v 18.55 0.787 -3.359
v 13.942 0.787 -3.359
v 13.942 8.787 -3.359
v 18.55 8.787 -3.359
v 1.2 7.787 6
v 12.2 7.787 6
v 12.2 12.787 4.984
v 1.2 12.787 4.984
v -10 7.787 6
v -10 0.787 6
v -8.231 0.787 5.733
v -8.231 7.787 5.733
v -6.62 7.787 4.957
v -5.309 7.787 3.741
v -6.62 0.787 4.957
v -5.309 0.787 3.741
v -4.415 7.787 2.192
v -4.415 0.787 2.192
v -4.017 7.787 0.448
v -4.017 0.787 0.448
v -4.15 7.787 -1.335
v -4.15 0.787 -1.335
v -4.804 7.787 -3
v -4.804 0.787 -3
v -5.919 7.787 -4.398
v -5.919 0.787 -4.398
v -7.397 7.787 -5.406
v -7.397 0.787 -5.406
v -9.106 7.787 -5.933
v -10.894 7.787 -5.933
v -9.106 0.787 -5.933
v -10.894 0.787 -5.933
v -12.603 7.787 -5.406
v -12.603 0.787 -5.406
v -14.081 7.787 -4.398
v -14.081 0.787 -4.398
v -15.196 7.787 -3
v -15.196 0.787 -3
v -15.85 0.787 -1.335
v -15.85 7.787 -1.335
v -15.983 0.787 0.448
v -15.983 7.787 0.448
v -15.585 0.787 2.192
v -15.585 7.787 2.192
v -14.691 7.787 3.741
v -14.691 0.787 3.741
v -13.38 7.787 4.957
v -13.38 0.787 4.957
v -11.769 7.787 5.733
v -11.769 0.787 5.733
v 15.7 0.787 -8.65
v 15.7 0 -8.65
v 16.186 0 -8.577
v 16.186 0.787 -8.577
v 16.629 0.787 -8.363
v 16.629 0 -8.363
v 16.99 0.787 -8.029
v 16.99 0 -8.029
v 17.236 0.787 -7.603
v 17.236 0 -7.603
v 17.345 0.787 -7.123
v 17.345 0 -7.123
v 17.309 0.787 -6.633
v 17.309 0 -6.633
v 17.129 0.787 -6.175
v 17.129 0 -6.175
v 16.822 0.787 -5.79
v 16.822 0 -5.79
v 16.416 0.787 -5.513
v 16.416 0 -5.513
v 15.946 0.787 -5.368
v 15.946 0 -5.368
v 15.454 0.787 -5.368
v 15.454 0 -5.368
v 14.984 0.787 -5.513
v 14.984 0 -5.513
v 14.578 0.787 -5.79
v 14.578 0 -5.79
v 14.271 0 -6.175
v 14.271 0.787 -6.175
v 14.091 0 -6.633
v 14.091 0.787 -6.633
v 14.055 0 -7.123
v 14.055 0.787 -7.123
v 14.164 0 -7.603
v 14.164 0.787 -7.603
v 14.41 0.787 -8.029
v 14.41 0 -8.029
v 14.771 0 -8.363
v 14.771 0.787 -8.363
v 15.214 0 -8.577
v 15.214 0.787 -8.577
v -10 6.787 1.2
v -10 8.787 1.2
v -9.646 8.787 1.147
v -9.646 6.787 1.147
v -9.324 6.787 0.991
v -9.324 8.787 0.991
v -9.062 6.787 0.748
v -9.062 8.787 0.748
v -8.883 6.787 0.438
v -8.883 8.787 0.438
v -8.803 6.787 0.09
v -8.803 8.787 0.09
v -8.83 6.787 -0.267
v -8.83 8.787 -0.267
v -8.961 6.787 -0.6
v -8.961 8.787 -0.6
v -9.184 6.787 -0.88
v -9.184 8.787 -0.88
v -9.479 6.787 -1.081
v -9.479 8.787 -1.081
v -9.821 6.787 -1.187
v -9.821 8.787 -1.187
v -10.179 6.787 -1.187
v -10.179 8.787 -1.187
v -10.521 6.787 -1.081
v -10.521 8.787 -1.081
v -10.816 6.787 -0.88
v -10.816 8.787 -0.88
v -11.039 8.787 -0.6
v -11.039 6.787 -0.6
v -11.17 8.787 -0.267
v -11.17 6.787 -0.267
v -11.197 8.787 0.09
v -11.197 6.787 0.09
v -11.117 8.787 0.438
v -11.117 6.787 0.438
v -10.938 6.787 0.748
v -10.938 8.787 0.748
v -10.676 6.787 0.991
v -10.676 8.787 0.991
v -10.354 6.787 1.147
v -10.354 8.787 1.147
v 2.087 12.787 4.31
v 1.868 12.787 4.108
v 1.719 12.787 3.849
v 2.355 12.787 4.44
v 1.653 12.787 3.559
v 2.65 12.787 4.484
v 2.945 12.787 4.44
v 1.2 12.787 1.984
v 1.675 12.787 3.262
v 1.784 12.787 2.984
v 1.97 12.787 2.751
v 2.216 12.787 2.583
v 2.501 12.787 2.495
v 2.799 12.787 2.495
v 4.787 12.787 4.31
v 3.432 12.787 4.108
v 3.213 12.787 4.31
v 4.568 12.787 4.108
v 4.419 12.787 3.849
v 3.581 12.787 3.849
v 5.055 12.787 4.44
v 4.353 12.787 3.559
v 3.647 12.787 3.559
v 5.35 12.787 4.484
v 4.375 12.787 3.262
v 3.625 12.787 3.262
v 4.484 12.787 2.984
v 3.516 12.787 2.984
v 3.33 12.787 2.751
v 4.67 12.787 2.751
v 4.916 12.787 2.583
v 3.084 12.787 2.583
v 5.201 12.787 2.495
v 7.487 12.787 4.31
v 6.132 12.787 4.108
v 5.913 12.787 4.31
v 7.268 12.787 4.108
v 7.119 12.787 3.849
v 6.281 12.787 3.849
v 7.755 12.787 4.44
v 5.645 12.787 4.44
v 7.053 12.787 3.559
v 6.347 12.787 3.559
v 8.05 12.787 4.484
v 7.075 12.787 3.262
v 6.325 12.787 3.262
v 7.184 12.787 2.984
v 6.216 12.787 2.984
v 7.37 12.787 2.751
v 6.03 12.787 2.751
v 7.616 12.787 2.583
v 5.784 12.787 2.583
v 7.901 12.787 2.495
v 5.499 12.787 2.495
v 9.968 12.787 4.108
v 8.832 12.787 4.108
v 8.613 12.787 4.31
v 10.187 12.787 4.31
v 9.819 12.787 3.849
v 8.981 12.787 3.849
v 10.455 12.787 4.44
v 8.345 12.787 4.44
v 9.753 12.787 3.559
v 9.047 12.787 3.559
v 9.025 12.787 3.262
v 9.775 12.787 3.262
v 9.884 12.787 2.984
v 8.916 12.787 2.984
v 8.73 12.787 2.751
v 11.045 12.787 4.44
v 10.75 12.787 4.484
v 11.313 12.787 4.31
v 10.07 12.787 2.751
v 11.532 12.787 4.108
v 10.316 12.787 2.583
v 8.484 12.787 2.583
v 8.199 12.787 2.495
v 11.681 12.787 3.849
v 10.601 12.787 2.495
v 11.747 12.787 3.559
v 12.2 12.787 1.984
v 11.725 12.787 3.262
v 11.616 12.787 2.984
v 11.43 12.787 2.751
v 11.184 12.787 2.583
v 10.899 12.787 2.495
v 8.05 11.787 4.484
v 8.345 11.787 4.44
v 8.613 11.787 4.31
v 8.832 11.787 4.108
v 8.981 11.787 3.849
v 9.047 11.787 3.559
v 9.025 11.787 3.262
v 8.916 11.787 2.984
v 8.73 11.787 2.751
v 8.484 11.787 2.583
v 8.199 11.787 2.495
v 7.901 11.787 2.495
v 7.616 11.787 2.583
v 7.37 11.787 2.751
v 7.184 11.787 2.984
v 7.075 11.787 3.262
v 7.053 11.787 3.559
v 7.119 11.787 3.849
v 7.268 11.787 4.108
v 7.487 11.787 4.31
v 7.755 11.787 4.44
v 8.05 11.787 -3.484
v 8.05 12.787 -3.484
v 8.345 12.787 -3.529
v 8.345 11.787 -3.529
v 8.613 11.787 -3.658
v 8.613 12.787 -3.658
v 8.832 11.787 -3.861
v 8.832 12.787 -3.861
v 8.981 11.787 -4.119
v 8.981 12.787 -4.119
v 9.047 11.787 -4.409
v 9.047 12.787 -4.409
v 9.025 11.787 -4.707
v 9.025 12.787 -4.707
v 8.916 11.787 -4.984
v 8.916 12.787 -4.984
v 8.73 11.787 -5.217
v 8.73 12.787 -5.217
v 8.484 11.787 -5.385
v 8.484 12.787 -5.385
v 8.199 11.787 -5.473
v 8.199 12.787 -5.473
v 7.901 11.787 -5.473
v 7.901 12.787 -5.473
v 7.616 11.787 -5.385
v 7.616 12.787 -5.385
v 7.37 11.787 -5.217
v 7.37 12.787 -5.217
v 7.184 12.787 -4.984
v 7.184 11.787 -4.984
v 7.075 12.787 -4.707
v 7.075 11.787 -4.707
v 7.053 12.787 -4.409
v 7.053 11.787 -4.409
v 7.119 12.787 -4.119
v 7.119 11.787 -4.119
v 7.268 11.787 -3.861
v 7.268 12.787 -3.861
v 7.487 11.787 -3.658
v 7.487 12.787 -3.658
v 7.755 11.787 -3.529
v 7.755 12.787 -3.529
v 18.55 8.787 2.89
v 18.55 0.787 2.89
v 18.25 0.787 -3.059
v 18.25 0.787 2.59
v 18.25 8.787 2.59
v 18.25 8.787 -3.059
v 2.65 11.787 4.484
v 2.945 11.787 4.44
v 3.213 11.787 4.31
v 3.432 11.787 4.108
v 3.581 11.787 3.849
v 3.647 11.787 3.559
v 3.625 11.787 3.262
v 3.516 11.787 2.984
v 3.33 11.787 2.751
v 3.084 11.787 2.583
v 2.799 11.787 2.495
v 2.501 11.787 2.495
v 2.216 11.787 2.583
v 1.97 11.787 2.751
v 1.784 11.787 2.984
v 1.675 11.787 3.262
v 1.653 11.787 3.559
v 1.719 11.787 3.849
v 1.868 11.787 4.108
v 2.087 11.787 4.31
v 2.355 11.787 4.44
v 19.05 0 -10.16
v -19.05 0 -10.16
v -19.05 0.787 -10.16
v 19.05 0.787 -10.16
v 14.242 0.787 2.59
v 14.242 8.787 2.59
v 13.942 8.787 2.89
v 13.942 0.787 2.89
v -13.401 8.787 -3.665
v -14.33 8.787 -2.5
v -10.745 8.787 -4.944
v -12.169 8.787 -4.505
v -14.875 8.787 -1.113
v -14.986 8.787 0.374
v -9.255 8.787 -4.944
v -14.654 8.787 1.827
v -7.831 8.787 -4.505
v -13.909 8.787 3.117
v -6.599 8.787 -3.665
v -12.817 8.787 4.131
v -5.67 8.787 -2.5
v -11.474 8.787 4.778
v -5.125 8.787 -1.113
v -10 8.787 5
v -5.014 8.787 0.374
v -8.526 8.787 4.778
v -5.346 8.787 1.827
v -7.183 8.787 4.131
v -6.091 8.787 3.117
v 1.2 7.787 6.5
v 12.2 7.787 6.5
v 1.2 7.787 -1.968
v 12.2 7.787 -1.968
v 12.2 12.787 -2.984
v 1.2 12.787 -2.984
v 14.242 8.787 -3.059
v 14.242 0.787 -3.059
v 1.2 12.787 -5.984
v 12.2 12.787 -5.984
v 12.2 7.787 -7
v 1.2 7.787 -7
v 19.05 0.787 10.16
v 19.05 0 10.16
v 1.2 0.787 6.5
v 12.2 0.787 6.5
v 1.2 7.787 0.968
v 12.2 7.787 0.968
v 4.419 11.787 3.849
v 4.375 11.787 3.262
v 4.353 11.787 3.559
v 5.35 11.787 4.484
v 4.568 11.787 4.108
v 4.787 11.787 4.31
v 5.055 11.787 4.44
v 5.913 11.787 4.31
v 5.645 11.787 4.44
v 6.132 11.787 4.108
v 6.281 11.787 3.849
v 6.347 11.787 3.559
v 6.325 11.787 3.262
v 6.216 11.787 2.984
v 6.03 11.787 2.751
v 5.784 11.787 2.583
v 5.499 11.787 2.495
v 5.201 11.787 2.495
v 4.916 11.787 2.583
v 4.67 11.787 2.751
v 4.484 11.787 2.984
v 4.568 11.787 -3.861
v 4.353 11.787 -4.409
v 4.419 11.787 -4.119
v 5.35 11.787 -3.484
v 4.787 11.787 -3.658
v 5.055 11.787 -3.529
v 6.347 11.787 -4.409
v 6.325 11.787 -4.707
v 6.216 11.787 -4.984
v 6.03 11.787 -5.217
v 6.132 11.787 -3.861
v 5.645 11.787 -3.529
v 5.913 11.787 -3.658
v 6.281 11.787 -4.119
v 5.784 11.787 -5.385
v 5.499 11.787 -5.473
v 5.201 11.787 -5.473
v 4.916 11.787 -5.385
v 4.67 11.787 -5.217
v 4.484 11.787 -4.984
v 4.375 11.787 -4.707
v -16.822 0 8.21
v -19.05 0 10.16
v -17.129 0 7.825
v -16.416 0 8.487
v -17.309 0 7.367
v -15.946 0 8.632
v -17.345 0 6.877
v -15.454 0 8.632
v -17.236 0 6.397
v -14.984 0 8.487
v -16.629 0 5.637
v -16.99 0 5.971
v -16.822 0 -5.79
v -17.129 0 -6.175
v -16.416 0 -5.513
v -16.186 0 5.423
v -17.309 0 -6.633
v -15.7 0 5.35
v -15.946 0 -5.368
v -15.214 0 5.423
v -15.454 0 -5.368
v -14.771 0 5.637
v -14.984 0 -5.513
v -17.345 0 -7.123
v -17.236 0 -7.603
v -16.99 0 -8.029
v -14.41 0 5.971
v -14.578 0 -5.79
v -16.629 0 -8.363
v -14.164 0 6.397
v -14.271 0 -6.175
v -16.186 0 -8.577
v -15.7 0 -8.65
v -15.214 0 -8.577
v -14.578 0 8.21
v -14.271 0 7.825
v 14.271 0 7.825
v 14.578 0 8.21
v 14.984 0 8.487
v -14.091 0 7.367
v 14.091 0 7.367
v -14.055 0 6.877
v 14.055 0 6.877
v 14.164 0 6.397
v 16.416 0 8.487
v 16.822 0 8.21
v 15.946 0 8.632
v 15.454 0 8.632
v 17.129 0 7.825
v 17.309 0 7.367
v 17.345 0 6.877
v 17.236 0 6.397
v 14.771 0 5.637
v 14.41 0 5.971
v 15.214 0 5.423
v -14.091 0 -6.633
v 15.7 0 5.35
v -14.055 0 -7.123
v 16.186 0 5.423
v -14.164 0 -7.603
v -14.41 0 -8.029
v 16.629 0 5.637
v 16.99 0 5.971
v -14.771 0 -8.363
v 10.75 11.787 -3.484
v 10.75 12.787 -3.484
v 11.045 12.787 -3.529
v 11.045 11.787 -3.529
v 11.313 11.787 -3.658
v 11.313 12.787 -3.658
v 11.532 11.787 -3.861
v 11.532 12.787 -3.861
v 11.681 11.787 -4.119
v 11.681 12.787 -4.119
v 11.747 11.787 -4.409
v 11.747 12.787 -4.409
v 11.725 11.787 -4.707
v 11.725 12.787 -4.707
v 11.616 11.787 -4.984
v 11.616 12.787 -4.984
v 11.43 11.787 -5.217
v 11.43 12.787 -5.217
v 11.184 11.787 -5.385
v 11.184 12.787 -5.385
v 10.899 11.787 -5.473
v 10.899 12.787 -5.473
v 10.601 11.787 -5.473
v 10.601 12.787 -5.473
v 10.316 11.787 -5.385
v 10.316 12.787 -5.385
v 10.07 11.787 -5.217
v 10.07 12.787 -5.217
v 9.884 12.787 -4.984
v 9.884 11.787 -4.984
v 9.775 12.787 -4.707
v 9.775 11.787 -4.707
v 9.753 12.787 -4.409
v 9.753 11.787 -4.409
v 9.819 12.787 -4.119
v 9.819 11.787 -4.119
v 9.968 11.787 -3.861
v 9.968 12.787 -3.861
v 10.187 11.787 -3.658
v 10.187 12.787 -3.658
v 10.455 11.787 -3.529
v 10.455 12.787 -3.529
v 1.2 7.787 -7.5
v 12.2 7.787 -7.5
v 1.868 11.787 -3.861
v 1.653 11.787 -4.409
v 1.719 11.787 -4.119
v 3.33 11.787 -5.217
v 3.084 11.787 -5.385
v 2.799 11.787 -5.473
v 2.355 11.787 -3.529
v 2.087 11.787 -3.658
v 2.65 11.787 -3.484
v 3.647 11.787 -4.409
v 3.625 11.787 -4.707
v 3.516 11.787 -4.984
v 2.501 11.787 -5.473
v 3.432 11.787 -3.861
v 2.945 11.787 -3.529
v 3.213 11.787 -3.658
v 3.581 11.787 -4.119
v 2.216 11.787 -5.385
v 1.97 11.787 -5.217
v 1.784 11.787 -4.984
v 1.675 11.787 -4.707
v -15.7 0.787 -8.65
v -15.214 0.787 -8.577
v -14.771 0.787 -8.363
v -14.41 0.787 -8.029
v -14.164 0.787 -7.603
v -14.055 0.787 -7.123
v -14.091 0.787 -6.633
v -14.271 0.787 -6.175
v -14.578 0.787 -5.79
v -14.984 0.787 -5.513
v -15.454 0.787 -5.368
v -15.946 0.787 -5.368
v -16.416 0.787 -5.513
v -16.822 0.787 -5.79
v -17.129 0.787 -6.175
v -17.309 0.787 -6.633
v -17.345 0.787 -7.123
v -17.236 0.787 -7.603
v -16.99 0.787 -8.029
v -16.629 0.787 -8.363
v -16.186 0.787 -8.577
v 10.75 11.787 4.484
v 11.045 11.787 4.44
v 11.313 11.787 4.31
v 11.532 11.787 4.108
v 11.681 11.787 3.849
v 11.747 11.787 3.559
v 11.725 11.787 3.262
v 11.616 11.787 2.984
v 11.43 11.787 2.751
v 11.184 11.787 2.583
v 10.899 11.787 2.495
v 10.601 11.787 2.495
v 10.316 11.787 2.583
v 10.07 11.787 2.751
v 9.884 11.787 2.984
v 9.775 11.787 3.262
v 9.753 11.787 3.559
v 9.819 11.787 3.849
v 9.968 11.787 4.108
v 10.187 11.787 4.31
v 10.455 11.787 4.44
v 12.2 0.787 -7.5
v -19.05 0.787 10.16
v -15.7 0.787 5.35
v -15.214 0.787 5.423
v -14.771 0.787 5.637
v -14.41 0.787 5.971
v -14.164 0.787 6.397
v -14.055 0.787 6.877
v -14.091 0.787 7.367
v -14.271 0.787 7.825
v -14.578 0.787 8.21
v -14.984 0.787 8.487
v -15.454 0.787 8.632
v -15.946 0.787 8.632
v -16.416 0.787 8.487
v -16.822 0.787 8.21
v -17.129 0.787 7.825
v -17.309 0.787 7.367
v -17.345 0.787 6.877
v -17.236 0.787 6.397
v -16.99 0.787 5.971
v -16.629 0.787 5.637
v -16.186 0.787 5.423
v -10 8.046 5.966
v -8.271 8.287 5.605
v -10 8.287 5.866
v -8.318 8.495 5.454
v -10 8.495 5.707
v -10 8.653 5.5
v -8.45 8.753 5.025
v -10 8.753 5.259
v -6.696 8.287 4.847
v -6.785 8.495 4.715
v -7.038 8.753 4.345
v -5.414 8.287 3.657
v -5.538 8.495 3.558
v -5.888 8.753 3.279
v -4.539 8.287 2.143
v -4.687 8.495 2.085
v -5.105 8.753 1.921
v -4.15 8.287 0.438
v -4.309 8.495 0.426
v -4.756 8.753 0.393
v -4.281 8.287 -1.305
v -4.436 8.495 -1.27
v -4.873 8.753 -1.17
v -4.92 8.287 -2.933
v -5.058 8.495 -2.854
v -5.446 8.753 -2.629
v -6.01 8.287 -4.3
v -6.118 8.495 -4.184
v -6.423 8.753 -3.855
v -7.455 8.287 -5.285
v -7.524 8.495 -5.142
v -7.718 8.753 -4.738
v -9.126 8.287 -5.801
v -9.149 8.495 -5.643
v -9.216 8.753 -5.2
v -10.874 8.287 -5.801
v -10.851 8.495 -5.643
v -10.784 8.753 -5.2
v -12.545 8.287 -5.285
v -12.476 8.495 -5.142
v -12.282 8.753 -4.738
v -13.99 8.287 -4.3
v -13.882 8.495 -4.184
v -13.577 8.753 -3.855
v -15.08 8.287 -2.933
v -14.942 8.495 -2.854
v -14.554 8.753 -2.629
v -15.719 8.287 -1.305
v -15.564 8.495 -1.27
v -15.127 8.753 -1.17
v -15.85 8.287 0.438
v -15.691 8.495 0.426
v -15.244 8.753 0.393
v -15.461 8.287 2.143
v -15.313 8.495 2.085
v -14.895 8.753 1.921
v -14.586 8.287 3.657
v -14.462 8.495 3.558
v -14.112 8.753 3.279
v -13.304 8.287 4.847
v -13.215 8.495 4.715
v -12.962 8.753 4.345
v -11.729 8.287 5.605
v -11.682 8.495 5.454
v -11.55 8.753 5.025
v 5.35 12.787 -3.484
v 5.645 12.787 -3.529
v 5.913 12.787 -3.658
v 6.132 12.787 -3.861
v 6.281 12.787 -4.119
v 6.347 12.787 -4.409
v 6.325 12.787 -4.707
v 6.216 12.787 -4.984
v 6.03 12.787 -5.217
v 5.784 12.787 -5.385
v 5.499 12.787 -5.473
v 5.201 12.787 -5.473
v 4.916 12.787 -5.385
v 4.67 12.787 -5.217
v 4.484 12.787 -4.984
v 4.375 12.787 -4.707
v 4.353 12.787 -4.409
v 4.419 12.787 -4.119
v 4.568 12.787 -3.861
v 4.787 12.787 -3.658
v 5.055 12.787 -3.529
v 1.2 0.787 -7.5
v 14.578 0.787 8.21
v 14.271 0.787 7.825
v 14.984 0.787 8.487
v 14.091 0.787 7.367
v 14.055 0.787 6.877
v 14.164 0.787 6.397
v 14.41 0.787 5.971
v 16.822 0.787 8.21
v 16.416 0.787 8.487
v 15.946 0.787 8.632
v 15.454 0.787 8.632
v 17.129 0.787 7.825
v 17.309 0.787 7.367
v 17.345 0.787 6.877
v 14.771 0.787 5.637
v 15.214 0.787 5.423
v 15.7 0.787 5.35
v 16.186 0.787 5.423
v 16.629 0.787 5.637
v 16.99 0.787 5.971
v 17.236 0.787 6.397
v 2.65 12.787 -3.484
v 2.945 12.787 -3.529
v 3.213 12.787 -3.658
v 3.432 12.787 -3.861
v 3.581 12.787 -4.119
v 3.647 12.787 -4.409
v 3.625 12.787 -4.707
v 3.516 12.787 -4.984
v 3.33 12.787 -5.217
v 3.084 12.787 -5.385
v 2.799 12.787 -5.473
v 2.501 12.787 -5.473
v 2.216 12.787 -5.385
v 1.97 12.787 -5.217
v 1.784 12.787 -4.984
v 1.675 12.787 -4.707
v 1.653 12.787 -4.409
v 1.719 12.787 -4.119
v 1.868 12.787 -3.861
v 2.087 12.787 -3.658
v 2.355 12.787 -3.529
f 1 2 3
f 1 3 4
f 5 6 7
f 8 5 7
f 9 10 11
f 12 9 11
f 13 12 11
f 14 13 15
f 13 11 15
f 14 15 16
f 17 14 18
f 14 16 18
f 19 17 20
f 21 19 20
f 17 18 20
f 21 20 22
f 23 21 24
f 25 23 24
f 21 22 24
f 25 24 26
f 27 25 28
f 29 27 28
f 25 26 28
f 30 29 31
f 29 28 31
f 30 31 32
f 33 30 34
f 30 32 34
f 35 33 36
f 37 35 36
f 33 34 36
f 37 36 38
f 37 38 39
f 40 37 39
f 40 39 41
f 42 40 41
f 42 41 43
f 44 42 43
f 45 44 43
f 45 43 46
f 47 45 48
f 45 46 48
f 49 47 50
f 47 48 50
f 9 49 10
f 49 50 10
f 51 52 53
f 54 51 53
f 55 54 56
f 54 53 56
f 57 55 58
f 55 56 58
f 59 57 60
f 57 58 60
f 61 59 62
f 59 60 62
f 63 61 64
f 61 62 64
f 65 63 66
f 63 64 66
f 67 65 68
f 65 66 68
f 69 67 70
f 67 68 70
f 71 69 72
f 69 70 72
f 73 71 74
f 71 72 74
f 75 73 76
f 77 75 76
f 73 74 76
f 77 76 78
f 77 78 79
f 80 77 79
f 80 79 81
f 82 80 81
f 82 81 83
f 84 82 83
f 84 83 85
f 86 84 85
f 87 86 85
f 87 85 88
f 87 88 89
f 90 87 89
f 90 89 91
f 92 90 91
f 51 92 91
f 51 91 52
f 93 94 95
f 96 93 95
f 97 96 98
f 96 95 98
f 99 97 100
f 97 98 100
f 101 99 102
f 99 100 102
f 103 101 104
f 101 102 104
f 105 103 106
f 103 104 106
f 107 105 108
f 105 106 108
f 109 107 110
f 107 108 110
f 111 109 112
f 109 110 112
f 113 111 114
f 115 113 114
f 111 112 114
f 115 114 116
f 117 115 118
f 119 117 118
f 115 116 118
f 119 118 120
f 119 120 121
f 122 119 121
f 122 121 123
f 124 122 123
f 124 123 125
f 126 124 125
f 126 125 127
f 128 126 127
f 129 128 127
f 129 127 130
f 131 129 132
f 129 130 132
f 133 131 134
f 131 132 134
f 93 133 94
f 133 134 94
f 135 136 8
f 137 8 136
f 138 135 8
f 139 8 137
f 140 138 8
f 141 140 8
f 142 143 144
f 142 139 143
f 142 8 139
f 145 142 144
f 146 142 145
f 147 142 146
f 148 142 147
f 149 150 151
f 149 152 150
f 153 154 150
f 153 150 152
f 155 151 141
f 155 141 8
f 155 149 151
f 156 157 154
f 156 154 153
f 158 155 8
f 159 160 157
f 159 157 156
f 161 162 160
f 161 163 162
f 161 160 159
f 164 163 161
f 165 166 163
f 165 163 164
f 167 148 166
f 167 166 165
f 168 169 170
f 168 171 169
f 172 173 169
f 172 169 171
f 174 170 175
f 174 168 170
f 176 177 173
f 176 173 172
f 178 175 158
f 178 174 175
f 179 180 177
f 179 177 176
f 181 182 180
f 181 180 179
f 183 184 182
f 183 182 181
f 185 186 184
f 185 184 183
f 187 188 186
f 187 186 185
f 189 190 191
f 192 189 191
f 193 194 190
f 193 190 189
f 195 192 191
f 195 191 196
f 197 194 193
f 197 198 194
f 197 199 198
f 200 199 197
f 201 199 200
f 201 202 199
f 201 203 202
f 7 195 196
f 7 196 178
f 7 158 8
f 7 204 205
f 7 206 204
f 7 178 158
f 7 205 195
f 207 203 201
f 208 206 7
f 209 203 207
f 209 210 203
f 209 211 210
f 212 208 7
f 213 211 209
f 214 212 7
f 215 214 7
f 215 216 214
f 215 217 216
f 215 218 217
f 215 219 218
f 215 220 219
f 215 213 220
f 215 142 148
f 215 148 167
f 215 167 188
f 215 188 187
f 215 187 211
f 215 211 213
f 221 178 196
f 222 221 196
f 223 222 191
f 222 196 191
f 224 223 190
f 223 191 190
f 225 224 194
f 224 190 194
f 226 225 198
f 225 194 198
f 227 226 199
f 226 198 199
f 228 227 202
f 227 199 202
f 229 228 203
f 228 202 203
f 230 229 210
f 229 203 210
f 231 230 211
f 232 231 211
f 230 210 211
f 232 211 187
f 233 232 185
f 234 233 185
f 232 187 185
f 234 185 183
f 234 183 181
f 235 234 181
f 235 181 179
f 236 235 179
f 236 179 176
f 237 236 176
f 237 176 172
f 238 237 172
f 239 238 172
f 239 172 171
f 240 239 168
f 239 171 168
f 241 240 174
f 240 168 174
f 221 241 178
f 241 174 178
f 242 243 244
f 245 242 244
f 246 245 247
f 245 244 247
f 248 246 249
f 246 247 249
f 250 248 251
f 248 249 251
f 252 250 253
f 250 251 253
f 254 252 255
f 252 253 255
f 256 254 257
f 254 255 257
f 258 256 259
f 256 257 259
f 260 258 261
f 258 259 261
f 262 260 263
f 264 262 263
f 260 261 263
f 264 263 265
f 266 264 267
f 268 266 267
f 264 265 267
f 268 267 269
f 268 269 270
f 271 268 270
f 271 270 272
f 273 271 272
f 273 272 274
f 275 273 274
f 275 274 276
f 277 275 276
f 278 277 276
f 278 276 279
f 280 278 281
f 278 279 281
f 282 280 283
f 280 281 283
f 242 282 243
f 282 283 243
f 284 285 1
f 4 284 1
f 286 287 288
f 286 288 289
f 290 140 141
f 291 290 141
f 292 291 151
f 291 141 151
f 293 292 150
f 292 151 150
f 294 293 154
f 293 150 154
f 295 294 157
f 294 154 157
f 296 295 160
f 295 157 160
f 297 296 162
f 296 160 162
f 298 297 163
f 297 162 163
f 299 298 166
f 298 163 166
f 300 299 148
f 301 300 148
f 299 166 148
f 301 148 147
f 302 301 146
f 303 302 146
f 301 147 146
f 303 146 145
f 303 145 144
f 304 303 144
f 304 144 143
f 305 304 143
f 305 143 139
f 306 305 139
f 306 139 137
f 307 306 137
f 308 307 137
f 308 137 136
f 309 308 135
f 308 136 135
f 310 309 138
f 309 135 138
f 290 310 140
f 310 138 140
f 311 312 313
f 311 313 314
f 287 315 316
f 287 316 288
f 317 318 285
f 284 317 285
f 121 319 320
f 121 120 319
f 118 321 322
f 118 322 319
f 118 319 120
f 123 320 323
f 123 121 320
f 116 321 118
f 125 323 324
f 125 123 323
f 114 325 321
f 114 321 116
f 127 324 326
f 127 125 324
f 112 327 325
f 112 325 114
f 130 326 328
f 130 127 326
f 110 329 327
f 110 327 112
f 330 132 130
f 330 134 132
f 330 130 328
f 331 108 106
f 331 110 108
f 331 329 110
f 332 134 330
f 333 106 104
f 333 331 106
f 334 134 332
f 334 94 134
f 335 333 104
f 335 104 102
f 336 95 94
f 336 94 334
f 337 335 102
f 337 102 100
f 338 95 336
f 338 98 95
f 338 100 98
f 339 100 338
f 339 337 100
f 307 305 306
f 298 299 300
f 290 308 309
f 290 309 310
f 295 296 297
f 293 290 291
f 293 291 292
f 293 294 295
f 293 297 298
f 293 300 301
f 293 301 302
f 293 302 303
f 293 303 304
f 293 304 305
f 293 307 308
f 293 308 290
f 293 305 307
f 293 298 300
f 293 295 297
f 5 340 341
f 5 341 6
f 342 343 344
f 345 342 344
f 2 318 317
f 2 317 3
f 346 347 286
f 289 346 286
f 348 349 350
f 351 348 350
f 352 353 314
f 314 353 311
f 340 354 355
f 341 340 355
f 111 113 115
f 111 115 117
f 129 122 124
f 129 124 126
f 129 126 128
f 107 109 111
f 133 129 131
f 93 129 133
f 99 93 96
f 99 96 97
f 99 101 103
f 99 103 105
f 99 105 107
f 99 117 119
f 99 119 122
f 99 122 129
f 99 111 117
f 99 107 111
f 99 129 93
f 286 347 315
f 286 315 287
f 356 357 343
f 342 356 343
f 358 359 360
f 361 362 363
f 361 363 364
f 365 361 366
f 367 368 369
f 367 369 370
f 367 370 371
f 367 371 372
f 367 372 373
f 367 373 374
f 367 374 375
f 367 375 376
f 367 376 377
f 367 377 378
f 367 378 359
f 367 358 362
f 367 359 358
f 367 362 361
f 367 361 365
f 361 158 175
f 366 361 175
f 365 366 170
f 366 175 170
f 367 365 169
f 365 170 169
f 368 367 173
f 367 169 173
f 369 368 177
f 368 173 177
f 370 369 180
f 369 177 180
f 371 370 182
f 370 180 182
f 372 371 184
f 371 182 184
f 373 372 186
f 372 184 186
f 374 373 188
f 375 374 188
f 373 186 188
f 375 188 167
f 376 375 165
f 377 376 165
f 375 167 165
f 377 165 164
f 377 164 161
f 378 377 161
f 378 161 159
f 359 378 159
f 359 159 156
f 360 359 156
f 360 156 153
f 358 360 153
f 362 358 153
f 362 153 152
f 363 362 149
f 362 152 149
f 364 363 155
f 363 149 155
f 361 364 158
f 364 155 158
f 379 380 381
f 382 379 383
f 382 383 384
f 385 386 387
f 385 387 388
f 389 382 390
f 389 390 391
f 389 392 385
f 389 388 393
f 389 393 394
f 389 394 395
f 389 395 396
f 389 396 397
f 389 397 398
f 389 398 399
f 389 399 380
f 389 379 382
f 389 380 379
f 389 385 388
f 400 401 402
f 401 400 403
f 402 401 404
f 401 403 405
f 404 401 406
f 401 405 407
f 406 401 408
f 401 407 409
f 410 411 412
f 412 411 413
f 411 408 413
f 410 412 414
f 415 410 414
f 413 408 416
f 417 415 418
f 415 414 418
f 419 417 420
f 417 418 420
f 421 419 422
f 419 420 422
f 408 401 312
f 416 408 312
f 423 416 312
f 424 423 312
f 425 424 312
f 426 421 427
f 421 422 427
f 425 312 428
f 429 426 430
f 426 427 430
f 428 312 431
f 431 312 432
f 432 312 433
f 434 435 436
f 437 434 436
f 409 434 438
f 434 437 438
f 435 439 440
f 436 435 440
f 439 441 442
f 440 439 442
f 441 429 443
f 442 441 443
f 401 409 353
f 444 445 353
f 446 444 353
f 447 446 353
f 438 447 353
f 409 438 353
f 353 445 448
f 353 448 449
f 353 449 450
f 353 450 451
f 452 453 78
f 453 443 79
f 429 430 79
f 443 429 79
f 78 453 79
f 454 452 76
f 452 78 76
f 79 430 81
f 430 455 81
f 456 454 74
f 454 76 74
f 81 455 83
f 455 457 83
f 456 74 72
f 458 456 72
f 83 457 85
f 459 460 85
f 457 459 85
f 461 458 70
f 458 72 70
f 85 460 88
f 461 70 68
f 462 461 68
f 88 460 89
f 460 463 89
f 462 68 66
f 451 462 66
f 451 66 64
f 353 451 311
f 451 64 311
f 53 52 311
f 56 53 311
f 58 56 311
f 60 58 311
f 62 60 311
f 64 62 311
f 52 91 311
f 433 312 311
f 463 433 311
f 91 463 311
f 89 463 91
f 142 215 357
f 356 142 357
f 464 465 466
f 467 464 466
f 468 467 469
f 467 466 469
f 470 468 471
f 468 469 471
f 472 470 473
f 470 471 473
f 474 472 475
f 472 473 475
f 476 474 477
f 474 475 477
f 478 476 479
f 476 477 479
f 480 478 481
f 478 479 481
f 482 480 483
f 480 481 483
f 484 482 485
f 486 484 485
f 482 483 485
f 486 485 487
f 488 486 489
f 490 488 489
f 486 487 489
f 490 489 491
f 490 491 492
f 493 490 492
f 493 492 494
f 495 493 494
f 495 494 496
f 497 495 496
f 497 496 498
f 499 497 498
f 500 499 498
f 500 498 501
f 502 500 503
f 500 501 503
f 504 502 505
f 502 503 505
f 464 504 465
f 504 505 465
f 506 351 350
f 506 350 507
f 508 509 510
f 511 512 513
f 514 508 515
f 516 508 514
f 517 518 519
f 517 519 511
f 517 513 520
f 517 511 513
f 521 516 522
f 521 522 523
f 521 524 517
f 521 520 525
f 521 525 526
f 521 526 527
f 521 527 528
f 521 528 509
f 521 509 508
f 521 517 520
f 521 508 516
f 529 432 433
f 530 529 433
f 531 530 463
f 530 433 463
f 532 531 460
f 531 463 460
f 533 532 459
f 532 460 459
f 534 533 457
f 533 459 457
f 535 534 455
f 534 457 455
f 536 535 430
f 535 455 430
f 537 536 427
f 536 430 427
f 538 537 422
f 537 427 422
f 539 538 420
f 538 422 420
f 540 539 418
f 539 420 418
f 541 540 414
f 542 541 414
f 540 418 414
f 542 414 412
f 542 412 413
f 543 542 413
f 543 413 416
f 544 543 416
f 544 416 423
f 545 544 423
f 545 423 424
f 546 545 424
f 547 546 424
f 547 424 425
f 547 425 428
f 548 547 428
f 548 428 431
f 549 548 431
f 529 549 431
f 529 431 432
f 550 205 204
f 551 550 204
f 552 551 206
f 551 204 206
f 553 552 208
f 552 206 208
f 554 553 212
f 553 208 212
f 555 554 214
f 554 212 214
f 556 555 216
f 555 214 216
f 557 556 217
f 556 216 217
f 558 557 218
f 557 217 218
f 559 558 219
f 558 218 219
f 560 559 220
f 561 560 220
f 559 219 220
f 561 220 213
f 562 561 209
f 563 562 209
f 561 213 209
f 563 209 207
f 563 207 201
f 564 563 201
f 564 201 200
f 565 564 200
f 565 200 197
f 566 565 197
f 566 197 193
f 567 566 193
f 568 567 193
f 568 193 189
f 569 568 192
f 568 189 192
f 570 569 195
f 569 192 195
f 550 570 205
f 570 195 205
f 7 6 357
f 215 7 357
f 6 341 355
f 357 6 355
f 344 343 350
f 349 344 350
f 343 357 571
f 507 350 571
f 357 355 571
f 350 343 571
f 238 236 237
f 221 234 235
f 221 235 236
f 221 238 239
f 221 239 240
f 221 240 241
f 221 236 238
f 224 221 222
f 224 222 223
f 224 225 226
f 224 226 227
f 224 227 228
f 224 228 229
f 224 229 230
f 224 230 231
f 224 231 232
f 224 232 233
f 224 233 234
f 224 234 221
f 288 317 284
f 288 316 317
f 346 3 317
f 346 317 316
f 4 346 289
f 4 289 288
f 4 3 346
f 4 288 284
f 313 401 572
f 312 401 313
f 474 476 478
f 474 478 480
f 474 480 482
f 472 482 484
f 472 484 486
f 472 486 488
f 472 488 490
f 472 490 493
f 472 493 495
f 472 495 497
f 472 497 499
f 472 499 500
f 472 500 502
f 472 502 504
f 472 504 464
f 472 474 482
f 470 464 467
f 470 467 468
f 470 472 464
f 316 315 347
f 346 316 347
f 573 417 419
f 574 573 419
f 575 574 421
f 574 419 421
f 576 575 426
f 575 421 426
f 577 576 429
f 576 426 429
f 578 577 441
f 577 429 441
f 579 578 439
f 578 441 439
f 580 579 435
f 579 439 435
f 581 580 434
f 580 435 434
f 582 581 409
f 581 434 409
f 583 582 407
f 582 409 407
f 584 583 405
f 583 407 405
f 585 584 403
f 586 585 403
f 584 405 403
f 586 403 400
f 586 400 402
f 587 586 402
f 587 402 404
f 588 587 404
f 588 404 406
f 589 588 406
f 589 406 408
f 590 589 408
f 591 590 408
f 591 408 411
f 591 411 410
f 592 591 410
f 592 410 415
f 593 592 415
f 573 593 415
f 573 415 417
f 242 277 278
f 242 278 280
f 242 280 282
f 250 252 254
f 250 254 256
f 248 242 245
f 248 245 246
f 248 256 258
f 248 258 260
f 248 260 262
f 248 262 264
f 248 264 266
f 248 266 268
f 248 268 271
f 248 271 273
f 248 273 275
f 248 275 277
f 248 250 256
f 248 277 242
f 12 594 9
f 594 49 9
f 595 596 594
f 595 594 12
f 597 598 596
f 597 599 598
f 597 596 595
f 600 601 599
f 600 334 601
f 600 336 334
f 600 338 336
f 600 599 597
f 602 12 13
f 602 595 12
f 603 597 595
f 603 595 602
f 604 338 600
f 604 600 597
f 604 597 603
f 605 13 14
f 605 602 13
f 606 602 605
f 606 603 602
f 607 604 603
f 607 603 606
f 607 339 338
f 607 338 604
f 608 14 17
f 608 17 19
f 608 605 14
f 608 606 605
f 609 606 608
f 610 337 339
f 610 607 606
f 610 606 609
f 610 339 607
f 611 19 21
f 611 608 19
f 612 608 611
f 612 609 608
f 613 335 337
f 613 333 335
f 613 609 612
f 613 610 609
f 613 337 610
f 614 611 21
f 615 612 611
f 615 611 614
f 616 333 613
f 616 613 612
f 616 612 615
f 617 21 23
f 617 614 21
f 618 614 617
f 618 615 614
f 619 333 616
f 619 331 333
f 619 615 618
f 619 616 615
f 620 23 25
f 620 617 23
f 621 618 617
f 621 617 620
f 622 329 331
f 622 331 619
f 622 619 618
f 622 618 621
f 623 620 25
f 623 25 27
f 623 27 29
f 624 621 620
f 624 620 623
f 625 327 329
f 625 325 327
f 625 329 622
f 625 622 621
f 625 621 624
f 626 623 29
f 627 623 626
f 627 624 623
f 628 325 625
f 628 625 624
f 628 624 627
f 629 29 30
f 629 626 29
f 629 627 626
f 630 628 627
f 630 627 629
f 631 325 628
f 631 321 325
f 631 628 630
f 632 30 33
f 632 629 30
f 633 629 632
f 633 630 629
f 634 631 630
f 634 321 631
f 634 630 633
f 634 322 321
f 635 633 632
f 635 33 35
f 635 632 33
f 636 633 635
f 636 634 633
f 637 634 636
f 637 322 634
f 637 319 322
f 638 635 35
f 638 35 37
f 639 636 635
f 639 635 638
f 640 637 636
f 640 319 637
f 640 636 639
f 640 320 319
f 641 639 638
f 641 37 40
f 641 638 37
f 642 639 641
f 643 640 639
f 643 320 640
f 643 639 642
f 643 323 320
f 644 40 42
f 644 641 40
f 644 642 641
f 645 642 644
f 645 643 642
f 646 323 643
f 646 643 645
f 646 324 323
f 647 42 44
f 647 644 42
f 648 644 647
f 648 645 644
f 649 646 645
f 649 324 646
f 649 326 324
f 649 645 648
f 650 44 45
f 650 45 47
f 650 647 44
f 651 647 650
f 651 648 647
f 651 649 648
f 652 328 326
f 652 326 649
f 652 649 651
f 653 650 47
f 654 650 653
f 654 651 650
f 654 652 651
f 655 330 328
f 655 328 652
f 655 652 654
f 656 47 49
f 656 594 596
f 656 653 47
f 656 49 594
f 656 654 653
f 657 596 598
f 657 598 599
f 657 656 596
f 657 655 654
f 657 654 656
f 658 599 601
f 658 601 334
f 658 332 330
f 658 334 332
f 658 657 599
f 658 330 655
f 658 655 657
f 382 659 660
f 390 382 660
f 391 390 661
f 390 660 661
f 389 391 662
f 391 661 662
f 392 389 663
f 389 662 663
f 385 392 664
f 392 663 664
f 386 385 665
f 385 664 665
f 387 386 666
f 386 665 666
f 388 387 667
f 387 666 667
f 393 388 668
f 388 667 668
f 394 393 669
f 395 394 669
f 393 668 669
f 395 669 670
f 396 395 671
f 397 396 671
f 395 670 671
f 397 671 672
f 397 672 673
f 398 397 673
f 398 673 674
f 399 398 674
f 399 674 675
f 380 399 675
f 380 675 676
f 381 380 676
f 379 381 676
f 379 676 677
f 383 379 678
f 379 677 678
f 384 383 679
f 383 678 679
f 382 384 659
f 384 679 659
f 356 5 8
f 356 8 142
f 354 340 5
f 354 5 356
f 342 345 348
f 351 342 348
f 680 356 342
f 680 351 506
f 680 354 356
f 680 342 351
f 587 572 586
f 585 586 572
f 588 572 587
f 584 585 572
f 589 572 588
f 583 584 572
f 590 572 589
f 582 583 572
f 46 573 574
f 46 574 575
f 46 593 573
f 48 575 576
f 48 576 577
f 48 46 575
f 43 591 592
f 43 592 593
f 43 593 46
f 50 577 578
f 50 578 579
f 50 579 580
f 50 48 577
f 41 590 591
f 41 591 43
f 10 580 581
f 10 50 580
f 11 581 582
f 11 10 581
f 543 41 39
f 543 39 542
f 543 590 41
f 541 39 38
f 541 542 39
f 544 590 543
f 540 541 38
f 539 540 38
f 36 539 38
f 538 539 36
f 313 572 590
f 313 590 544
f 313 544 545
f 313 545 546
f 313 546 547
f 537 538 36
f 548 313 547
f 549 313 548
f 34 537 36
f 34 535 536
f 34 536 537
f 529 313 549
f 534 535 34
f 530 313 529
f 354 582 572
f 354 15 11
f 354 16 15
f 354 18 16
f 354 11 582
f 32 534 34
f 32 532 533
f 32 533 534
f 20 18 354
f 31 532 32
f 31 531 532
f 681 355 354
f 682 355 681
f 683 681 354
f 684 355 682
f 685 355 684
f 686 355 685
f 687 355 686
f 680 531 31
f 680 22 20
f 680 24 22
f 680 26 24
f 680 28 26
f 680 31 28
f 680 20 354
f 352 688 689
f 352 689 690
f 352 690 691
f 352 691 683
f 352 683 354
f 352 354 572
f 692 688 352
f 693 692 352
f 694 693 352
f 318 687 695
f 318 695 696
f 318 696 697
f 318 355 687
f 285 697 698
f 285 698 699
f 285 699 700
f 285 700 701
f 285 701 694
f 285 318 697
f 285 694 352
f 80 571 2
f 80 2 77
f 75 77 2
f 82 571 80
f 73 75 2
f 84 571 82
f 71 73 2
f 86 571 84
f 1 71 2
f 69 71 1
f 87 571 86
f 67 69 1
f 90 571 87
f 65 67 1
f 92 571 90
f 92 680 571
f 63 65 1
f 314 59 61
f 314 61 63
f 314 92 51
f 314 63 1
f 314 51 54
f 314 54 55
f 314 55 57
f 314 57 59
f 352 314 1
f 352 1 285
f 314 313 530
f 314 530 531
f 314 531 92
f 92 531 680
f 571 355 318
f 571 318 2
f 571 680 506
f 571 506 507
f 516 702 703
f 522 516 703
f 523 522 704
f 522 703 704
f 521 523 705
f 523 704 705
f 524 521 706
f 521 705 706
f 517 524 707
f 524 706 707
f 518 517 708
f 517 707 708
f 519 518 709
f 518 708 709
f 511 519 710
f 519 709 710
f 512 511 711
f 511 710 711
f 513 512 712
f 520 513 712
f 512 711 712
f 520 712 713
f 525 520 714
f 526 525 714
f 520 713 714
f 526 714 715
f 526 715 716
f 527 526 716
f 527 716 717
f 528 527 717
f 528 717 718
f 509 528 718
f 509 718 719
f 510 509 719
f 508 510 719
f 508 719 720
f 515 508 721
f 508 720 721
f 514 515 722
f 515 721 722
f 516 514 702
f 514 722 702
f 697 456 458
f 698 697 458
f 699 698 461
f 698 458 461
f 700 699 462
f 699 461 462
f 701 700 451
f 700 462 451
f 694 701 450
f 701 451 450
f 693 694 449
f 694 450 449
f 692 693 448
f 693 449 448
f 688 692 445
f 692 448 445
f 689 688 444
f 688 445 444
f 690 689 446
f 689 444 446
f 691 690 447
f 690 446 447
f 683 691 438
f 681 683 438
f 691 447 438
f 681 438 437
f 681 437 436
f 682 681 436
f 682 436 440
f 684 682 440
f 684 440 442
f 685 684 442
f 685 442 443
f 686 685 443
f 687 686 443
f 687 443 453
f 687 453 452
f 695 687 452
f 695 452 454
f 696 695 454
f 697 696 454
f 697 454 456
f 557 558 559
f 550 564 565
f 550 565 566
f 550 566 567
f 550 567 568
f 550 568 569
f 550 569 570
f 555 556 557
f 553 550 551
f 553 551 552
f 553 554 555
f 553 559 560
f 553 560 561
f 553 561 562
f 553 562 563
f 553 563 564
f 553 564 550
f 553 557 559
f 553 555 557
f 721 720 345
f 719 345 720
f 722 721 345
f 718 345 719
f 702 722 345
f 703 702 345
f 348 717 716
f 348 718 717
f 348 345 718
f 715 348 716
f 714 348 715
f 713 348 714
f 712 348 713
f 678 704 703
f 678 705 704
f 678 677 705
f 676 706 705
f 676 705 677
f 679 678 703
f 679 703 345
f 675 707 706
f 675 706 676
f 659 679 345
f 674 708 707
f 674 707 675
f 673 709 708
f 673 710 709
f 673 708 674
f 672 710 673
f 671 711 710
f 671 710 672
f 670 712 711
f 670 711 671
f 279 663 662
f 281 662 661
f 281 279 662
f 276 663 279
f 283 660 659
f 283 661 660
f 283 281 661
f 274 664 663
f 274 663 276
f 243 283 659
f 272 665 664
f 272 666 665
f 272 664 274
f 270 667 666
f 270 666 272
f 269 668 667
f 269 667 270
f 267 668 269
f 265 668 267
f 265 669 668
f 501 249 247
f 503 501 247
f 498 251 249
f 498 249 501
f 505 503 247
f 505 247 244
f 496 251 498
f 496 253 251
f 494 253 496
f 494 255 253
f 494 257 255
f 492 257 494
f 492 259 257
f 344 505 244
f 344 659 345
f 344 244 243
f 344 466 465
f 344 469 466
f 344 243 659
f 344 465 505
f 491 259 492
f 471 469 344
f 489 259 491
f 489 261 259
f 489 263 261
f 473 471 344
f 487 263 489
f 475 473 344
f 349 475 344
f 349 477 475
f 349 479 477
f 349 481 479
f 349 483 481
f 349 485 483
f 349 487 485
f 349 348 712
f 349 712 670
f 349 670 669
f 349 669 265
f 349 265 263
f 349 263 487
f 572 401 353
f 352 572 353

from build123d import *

# Parameters (mm, degrees)
SKETCH1_W           = 38.1
SKETCH1_H           = 20.32
BOSS_EXTRUDE1_DEPTH = 0.7874
SKETCH3_R           = 1.65
CUT_EXTRUDE2_DEPTH  = 10
SKETCH4_R           = 6
BOSS_EXTRUDE2_DEPTH = 8
FILLET1_R           = 1
SKETCH5_R           = 1.2
CUT_EXTRUDE3_DEPTH  = 2
SKETCH6_W           = 11
SKETCH6_H           = 14
BOSS_EXTRUDE3_DEPTH = 12
CUT_EXTRUDE4_DEPTH  = 12
SKETCH8_R           = 1
CUT_EXTRUDE5_DEPTH  = 1
SKETCH9_W           = 4.608332255
SKETCH9_H           = 6.248586108
SKETCH9_W_2         = 4.008332255
SKETCH9_H_2         = 5.648586108
BOSS_EXTRUDE4_DEPTH = 8


with BuildPart() as part:
    # Sketch1 → Boss-Extrude1 (new body)
    with BuildSketch(Plane(origin=(0, 0, 0), x_dir=(1, 0, 0), z_dir=(0, 1, 0))):
        Rectangle(SKETCH1_W, SKETCH1_H)
    extrude(amount=BOSS_EXTRUDE1_DEPTH)

    # Sketch3 → Cut-Extrude2 (cut)
    with BuildSketch(Plane.XZ):
        with Locations(Location((-15.7, 7, 0), (0, 0, 270))):
            Circle(SKETCH3_R)
        with Locations(Location((15.7, 7, 0), (0, 0, 270))):
            Circle(SKETCH3_R)
        with Locations(Location((15.7, -7, 0), (0, 0, 270))):
            Circle(SKETCH3_R)
        with Locations(Location((-15.7, -7, 0), (0, 0, 270))):
            Circle(SKETCH3_R)
    extrude(amount=-CUT_EXTRUDE2_DEPTH, mode=Mode.SUBTRACT)

    # Sketch4 → Boss-Extrude2 (add)
    with BuildSketch(Plane(origin=(0, 0.7874, 0), x_dir=(1, 0, 0), z_dir=(0, 1, 0))):
        with Locations(Location((-10, 0, 0), (0, 0, 270))):
            Circle(SKETCH4_R)
    extrude(amount=BOSS_EXTRUDE2_DEPTH)

    # Fillet1
    fillet1_edges = [part.edges().sort_by_distance(p)[0] for p in [
        (-10, 8.7874, -6),
    ]]
    fillet(fillet1_edges, radius=FILLET1_R)

    # Sketch5 → Cut-Extrude3 (cut)
    with BuildSketch(Plane(origin=(0, 8.7874, 0), x_dir=(1, 0, 0), z_dir=(0, 1, 0))):
        with Locations(Location((-10, 0, 0), (0, 0, 270))):
            Circle(SKETCH5_R)
    extrude(amount=-CUT_EXTRUDE3_DEPTH, mode=Mode.SUBTRACT)

    # Sketch6 → Boss-Extrude3 (add)
    with BuildSketch(Plane(origin=(0, 0.7874, 0), x_dir=(1, 0, 0), z_dir=(0, 1, 0))):
        with Locations((6.7, 0.5)):
            Rectangle(SKETCH6_W, SKETCH6_H)
    extrude(amount=BOSS_EXTRUDE3_DEPTH)

    # Sketch7 → Cut-Extrude4 (cut)
    with BuildSketch(Plane(origin=(12.2, 0, 0), x_dir=(0, 0, -1), z_dir=(1, 0, 0))):
        Polygon((-6, 7.7874), (-4.984156555, 12.7874), (-6.5, 12.7874), (-6.5, 7.7874), align=None)
        Polygon((-1.984156555, 12.7874), (-0.96831311, 7.7874), (1.96831311, 7.7874), (2.984156555, 12.7874), align=None)
        Polygon((5.984156555, 12.7874), (7, 7.7874), (7.5, 7.7874), (7.5, 12.7874), align=None)
    extrude(amount=-CUT_EXTRUDE4_DEPTH, mode=Mode.SUBTRACT)

    # Sketch8 → Cut-Extrude5 (cut)
    with BuildSketch(Plane(origin=(0, 12.7874, 0), x_dir=(1, 0, 0), z_dir=(0, 1, 0))):
        with Locations(Location((10.75, -3.484156555, 0), (0, 0, 270))):
            Circle(SKETCH8_R)
        with Locations(Location((8.05, -3.484156555, 0), (0, 0, 270))):
            Circle(SKETCH8_R)
        with Locations(Location((5.35, -3.484156555, 0), (0, 0, 270))):
            Circle(SKETCH8_R)
        with Locations(Location((2.65, -3.484156555, 0), (0, 0, 270))):
            Circle(SKETCH8_R)
        with Locations(Location((10.75, 4.484156555, 0), (0, 0, 270))):
            Circle(SKETCH8_R)
        with Locations(Location((8.05, 4.484156555, 0), (0, 0, 270))):
            Circle(SKETCH8_R)
        with Locations(Location((5.35, 4.484156555, 0), (0, 0, 270))):
            Circle(SKETCH8_R)
        with Locations(Location((2.65, 4.484156555, 0), (0, 0, 270))):
            Circle(SKETCH8_R)
    extrude(amount=-CUT_EXTRUDE5_DEPTH, mode=Mode.SUBTRACT)

    # Sketch9 → Boss-Extrude4 (add)
    with BuildSketch(Plane(origin=(0, 0.7874, 0), x_dir=(1, 0, 0), z_dir=(0, 1, 0))):
        with Locations((16.246323881, 0.234321979)):
            Rectangle(SKETCH9_W, SKETCH9_H)
        with Locations((16.246323881, 0.234321979)):
            Rectangle(SKETCH9_W_2, SKETCH9_H_2, mode=Mode.SUBTRACT)
    extrude(amount=BOSS_EXTRUDE4_DEPTH)


solid = part.part
